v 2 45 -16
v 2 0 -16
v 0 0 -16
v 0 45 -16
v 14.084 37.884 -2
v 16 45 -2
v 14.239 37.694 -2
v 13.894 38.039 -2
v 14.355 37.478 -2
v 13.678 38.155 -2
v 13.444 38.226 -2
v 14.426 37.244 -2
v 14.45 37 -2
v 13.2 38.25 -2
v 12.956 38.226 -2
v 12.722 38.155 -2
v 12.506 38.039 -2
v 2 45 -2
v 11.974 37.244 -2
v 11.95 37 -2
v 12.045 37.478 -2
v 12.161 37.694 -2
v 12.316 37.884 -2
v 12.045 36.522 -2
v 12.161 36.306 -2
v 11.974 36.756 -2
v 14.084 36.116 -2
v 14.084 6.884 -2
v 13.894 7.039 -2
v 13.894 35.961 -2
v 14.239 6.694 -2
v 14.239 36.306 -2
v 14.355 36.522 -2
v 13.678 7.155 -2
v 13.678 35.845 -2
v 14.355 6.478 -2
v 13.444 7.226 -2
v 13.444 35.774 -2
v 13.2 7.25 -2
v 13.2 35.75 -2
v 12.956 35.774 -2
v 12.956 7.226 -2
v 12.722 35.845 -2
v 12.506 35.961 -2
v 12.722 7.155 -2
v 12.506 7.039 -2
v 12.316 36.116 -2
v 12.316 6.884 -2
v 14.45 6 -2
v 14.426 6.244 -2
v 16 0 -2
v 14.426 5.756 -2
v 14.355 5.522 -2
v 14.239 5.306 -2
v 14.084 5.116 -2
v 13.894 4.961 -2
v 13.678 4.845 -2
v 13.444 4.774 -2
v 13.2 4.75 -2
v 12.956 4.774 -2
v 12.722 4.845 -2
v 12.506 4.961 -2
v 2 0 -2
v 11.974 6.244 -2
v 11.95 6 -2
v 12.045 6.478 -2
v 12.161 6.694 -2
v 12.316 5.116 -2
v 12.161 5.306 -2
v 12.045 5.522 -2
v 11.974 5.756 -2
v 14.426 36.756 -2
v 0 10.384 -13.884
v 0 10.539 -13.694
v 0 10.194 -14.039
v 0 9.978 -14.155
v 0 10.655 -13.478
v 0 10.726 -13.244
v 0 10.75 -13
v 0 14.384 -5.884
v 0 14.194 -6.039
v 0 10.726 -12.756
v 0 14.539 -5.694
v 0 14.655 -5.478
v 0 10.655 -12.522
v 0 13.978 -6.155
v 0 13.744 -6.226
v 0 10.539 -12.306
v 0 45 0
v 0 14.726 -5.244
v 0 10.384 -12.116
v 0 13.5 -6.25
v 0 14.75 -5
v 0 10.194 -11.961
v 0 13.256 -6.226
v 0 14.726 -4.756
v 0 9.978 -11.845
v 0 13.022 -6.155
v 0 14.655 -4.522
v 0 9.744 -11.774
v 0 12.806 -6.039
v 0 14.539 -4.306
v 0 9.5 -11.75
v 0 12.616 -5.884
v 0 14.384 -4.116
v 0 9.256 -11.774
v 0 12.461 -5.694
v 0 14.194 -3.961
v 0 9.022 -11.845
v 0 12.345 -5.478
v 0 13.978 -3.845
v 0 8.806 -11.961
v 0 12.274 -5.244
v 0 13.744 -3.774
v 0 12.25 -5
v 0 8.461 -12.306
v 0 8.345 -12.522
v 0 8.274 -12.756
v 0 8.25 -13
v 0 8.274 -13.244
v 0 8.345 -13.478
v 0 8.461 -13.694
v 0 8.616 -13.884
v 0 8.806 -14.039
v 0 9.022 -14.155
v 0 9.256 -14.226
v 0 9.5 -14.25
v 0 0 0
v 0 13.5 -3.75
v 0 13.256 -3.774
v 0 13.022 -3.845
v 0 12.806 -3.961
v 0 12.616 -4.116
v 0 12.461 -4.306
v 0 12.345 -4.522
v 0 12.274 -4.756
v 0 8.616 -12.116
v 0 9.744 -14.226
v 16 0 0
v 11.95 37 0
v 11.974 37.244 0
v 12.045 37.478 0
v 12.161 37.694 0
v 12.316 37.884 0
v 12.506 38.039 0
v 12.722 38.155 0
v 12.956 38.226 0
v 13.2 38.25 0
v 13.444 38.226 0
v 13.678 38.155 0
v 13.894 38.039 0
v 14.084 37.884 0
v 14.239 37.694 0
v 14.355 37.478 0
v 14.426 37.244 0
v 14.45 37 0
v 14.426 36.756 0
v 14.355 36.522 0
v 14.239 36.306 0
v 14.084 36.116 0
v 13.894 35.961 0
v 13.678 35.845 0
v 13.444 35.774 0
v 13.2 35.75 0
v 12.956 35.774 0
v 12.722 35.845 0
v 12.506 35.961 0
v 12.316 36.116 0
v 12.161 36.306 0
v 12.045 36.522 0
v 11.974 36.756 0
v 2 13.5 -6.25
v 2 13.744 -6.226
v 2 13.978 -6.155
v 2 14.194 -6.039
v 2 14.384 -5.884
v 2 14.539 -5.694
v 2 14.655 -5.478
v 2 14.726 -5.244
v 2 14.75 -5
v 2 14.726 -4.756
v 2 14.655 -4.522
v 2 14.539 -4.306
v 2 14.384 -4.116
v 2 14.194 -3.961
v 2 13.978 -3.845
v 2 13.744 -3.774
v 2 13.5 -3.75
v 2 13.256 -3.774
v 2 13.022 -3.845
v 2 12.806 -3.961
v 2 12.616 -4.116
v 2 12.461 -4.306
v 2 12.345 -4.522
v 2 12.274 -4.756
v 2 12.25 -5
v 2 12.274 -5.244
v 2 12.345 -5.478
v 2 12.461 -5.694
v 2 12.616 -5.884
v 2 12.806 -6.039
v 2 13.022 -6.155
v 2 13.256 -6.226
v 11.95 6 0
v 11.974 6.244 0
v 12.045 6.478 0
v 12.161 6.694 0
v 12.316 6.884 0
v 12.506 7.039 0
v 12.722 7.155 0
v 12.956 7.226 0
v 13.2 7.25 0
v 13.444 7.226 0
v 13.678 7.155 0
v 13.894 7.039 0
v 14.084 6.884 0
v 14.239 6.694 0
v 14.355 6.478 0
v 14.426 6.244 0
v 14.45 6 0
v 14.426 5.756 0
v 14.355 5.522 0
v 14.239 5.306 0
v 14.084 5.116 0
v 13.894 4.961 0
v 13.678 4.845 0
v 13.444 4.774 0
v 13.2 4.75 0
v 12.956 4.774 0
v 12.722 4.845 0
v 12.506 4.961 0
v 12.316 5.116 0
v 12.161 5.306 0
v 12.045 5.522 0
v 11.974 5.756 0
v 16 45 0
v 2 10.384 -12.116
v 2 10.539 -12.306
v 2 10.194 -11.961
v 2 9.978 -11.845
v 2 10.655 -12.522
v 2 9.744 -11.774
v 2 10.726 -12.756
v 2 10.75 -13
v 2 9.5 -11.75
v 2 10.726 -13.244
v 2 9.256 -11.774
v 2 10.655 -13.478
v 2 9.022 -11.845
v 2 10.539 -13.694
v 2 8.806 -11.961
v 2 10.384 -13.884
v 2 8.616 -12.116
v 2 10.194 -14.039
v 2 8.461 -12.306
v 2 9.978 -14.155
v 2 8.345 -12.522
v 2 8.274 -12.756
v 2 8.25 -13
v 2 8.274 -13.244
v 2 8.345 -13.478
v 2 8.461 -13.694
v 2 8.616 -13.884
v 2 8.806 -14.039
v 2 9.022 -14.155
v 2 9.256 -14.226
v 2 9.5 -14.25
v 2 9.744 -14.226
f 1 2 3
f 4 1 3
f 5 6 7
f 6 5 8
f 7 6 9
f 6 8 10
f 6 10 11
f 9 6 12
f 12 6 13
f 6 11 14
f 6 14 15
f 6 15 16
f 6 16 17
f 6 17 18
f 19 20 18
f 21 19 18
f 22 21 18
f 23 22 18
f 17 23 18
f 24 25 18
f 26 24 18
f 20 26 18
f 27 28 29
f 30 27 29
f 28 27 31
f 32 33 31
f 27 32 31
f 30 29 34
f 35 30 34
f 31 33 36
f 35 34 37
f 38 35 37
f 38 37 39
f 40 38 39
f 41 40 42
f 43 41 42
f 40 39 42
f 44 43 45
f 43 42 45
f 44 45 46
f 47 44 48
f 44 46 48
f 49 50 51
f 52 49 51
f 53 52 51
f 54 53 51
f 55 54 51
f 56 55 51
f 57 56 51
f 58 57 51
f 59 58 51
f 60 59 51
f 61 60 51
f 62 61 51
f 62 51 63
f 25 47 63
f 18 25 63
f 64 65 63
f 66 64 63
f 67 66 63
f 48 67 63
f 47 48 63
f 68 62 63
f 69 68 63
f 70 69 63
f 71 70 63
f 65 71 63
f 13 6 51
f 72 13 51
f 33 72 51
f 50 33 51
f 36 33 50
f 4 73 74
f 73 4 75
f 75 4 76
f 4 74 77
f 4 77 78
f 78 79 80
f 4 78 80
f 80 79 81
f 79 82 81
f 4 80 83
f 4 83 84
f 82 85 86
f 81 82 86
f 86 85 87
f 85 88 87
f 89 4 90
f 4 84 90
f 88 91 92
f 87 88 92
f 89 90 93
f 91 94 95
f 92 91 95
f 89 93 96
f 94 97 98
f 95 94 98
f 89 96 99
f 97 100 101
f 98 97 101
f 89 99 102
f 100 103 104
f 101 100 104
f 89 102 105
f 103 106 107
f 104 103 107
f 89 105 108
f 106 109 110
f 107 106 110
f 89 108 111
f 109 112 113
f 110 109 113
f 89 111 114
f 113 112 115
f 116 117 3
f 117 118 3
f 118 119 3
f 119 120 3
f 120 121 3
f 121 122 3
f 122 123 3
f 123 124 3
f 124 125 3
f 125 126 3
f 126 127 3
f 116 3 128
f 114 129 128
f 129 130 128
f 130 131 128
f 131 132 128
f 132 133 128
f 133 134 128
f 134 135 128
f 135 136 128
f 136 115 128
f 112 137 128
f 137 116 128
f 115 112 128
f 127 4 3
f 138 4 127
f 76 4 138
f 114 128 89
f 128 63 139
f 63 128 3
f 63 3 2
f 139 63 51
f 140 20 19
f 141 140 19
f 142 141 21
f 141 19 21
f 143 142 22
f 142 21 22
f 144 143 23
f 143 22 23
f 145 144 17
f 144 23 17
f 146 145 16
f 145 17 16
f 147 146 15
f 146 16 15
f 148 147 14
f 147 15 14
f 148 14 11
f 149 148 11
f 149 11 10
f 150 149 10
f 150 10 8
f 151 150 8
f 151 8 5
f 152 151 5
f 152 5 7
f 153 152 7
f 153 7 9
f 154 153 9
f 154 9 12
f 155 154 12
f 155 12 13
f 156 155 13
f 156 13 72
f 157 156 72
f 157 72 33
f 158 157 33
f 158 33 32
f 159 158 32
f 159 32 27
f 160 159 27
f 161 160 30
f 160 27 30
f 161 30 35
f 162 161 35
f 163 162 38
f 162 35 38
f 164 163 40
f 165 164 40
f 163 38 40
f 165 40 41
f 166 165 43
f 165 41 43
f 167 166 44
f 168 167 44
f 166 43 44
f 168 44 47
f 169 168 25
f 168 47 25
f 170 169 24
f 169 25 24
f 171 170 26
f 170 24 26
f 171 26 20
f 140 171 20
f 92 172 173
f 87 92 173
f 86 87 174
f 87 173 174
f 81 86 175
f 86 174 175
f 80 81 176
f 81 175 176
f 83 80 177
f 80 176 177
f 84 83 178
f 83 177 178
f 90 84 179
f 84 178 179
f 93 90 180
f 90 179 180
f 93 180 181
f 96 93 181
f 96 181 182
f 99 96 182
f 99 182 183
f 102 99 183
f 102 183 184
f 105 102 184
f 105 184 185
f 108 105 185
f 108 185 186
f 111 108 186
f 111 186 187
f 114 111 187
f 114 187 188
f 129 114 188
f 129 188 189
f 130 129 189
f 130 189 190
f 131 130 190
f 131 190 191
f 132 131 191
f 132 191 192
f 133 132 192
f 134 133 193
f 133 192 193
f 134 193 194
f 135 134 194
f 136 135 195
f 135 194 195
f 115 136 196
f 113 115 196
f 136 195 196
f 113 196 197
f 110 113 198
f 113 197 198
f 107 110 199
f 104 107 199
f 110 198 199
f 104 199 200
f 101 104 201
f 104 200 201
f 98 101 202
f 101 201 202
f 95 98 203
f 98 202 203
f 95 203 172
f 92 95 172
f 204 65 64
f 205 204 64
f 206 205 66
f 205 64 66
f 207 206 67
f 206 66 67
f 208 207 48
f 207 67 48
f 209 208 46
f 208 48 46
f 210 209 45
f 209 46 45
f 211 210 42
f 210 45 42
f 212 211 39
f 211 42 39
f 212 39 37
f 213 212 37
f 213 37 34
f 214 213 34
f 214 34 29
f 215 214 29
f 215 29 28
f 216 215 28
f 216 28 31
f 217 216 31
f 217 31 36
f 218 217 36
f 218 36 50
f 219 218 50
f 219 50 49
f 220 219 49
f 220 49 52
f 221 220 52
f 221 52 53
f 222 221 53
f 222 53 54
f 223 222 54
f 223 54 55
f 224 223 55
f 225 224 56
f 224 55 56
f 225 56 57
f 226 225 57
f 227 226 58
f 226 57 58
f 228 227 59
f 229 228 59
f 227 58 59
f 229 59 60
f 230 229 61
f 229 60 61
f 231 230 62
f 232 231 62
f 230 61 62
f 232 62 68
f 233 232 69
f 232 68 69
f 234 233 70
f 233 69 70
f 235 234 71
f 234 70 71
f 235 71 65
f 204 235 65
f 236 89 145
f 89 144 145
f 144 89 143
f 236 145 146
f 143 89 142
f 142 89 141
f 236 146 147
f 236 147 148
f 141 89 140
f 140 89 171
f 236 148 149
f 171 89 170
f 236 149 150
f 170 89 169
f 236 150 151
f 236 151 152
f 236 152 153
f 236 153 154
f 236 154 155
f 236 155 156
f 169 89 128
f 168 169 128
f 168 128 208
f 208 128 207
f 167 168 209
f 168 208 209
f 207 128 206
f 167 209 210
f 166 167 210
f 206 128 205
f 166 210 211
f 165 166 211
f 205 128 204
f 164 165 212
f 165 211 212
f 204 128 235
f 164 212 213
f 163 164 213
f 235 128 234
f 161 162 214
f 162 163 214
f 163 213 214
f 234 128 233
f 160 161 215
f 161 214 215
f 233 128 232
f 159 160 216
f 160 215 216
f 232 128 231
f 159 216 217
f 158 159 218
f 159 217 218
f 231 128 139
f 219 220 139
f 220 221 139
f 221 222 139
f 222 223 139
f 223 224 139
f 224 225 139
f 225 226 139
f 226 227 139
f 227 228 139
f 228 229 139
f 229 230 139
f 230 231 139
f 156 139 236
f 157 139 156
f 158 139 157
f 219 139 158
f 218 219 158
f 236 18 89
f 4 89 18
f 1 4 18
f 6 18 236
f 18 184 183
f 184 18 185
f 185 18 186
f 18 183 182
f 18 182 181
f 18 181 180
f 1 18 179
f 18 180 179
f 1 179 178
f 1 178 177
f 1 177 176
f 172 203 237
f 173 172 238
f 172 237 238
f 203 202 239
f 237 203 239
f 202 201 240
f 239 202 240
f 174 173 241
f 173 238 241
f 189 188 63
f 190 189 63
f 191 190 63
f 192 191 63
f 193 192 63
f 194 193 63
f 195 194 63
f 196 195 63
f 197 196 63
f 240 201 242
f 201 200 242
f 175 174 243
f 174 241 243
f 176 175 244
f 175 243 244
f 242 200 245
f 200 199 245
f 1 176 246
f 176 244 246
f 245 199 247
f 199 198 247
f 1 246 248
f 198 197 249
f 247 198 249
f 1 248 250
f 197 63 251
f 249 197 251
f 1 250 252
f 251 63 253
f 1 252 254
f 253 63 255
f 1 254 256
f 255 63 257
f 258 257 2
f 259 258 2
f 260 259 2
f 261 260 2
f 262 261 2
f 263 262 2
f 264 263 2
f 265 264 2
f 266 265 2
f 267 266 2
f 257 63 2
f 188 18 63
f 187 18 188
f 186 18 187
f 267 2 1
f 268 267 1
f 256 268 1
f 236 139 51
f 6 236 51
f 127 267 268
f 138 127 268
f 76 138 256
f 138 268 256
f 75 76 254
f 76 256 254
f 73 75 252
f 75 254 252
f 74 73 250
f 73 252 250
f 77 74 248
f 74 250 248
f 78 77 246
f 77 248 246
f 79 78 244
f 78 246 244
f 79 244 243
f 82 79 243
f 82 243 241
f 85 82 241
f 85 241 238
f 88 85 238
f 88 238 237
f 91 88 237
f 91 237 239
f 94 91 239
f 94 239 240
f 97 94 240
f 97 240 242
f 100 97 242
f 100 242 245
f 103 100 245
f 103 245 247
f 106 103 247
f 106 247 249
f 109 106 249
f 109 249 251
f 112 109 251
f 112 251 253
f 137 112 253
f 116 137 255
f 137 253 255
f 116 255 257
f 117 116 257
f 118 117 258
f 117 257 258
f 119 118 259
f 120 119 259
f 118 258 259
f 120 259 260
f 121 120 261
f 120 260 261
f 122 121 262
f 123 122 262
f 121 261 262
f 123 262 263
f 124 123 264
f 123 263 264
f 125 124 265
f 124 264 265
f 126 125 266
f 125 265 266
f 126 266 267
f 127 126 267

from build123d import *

# Parameters (mm, degrees)
BOSS_EXTRUDE1_DEPTH = 45
SKETCH2_R           = 1.25
CUT_EXTRUDE1_DEPTH  = 50.769468553
SKETCH3_R           = 1.25
CUT_EXTRUDE2_DEPTH  = 50.769468553


with BuildPart() as part:
    # Sketch1 → Boss-Extrude1 (new body)
    with BuildSketch(Plane(origin=(0, 0, 0), x_dir=(1, 0, 0), z_dir=(0, 1, 0))):
        Polygon((0, 0), (16, 0), (16, 2), (2, 2), (2, 16), (0, 16), align=None)
    extrude(amount=BOSS_EXTRUDE1_DEPTH)

    # Sketch2 → Cut-Extrude1 (cut, through all)
    with BuildSketch(Plane(origin=(0, 0, -2), x_dir=(-1, 0, 0), z_dir=(0, 0, -1))):
        with Locations((-13.2, 37)):
            Circle(SKETCH2_R)
        with Locations((-13.2, 6)):
            Circle(SKETCH2_R)
    extrude(amount=-CUT_EXTRUDE1_DEPTH, mode=Mode.SUBTRACT)

    # Sketch3 → Cut-Extrude2 (cut, through all)
    with BuildSketch(Plane(origin=(2, 0, 0), x_dir=(0, 0, -1), z_dir=(1, 0, 0))):
        with Locations((13, 9.5)):
            Circle(SKETCH3_R)
        with Locations((5, 13.5)):
            Circle(SKETCH3_R)
    extrude(amount=-CUT_EXTRUDE2_DEPTH, mode=Mode.SUBTRACT)


solid = part.part
